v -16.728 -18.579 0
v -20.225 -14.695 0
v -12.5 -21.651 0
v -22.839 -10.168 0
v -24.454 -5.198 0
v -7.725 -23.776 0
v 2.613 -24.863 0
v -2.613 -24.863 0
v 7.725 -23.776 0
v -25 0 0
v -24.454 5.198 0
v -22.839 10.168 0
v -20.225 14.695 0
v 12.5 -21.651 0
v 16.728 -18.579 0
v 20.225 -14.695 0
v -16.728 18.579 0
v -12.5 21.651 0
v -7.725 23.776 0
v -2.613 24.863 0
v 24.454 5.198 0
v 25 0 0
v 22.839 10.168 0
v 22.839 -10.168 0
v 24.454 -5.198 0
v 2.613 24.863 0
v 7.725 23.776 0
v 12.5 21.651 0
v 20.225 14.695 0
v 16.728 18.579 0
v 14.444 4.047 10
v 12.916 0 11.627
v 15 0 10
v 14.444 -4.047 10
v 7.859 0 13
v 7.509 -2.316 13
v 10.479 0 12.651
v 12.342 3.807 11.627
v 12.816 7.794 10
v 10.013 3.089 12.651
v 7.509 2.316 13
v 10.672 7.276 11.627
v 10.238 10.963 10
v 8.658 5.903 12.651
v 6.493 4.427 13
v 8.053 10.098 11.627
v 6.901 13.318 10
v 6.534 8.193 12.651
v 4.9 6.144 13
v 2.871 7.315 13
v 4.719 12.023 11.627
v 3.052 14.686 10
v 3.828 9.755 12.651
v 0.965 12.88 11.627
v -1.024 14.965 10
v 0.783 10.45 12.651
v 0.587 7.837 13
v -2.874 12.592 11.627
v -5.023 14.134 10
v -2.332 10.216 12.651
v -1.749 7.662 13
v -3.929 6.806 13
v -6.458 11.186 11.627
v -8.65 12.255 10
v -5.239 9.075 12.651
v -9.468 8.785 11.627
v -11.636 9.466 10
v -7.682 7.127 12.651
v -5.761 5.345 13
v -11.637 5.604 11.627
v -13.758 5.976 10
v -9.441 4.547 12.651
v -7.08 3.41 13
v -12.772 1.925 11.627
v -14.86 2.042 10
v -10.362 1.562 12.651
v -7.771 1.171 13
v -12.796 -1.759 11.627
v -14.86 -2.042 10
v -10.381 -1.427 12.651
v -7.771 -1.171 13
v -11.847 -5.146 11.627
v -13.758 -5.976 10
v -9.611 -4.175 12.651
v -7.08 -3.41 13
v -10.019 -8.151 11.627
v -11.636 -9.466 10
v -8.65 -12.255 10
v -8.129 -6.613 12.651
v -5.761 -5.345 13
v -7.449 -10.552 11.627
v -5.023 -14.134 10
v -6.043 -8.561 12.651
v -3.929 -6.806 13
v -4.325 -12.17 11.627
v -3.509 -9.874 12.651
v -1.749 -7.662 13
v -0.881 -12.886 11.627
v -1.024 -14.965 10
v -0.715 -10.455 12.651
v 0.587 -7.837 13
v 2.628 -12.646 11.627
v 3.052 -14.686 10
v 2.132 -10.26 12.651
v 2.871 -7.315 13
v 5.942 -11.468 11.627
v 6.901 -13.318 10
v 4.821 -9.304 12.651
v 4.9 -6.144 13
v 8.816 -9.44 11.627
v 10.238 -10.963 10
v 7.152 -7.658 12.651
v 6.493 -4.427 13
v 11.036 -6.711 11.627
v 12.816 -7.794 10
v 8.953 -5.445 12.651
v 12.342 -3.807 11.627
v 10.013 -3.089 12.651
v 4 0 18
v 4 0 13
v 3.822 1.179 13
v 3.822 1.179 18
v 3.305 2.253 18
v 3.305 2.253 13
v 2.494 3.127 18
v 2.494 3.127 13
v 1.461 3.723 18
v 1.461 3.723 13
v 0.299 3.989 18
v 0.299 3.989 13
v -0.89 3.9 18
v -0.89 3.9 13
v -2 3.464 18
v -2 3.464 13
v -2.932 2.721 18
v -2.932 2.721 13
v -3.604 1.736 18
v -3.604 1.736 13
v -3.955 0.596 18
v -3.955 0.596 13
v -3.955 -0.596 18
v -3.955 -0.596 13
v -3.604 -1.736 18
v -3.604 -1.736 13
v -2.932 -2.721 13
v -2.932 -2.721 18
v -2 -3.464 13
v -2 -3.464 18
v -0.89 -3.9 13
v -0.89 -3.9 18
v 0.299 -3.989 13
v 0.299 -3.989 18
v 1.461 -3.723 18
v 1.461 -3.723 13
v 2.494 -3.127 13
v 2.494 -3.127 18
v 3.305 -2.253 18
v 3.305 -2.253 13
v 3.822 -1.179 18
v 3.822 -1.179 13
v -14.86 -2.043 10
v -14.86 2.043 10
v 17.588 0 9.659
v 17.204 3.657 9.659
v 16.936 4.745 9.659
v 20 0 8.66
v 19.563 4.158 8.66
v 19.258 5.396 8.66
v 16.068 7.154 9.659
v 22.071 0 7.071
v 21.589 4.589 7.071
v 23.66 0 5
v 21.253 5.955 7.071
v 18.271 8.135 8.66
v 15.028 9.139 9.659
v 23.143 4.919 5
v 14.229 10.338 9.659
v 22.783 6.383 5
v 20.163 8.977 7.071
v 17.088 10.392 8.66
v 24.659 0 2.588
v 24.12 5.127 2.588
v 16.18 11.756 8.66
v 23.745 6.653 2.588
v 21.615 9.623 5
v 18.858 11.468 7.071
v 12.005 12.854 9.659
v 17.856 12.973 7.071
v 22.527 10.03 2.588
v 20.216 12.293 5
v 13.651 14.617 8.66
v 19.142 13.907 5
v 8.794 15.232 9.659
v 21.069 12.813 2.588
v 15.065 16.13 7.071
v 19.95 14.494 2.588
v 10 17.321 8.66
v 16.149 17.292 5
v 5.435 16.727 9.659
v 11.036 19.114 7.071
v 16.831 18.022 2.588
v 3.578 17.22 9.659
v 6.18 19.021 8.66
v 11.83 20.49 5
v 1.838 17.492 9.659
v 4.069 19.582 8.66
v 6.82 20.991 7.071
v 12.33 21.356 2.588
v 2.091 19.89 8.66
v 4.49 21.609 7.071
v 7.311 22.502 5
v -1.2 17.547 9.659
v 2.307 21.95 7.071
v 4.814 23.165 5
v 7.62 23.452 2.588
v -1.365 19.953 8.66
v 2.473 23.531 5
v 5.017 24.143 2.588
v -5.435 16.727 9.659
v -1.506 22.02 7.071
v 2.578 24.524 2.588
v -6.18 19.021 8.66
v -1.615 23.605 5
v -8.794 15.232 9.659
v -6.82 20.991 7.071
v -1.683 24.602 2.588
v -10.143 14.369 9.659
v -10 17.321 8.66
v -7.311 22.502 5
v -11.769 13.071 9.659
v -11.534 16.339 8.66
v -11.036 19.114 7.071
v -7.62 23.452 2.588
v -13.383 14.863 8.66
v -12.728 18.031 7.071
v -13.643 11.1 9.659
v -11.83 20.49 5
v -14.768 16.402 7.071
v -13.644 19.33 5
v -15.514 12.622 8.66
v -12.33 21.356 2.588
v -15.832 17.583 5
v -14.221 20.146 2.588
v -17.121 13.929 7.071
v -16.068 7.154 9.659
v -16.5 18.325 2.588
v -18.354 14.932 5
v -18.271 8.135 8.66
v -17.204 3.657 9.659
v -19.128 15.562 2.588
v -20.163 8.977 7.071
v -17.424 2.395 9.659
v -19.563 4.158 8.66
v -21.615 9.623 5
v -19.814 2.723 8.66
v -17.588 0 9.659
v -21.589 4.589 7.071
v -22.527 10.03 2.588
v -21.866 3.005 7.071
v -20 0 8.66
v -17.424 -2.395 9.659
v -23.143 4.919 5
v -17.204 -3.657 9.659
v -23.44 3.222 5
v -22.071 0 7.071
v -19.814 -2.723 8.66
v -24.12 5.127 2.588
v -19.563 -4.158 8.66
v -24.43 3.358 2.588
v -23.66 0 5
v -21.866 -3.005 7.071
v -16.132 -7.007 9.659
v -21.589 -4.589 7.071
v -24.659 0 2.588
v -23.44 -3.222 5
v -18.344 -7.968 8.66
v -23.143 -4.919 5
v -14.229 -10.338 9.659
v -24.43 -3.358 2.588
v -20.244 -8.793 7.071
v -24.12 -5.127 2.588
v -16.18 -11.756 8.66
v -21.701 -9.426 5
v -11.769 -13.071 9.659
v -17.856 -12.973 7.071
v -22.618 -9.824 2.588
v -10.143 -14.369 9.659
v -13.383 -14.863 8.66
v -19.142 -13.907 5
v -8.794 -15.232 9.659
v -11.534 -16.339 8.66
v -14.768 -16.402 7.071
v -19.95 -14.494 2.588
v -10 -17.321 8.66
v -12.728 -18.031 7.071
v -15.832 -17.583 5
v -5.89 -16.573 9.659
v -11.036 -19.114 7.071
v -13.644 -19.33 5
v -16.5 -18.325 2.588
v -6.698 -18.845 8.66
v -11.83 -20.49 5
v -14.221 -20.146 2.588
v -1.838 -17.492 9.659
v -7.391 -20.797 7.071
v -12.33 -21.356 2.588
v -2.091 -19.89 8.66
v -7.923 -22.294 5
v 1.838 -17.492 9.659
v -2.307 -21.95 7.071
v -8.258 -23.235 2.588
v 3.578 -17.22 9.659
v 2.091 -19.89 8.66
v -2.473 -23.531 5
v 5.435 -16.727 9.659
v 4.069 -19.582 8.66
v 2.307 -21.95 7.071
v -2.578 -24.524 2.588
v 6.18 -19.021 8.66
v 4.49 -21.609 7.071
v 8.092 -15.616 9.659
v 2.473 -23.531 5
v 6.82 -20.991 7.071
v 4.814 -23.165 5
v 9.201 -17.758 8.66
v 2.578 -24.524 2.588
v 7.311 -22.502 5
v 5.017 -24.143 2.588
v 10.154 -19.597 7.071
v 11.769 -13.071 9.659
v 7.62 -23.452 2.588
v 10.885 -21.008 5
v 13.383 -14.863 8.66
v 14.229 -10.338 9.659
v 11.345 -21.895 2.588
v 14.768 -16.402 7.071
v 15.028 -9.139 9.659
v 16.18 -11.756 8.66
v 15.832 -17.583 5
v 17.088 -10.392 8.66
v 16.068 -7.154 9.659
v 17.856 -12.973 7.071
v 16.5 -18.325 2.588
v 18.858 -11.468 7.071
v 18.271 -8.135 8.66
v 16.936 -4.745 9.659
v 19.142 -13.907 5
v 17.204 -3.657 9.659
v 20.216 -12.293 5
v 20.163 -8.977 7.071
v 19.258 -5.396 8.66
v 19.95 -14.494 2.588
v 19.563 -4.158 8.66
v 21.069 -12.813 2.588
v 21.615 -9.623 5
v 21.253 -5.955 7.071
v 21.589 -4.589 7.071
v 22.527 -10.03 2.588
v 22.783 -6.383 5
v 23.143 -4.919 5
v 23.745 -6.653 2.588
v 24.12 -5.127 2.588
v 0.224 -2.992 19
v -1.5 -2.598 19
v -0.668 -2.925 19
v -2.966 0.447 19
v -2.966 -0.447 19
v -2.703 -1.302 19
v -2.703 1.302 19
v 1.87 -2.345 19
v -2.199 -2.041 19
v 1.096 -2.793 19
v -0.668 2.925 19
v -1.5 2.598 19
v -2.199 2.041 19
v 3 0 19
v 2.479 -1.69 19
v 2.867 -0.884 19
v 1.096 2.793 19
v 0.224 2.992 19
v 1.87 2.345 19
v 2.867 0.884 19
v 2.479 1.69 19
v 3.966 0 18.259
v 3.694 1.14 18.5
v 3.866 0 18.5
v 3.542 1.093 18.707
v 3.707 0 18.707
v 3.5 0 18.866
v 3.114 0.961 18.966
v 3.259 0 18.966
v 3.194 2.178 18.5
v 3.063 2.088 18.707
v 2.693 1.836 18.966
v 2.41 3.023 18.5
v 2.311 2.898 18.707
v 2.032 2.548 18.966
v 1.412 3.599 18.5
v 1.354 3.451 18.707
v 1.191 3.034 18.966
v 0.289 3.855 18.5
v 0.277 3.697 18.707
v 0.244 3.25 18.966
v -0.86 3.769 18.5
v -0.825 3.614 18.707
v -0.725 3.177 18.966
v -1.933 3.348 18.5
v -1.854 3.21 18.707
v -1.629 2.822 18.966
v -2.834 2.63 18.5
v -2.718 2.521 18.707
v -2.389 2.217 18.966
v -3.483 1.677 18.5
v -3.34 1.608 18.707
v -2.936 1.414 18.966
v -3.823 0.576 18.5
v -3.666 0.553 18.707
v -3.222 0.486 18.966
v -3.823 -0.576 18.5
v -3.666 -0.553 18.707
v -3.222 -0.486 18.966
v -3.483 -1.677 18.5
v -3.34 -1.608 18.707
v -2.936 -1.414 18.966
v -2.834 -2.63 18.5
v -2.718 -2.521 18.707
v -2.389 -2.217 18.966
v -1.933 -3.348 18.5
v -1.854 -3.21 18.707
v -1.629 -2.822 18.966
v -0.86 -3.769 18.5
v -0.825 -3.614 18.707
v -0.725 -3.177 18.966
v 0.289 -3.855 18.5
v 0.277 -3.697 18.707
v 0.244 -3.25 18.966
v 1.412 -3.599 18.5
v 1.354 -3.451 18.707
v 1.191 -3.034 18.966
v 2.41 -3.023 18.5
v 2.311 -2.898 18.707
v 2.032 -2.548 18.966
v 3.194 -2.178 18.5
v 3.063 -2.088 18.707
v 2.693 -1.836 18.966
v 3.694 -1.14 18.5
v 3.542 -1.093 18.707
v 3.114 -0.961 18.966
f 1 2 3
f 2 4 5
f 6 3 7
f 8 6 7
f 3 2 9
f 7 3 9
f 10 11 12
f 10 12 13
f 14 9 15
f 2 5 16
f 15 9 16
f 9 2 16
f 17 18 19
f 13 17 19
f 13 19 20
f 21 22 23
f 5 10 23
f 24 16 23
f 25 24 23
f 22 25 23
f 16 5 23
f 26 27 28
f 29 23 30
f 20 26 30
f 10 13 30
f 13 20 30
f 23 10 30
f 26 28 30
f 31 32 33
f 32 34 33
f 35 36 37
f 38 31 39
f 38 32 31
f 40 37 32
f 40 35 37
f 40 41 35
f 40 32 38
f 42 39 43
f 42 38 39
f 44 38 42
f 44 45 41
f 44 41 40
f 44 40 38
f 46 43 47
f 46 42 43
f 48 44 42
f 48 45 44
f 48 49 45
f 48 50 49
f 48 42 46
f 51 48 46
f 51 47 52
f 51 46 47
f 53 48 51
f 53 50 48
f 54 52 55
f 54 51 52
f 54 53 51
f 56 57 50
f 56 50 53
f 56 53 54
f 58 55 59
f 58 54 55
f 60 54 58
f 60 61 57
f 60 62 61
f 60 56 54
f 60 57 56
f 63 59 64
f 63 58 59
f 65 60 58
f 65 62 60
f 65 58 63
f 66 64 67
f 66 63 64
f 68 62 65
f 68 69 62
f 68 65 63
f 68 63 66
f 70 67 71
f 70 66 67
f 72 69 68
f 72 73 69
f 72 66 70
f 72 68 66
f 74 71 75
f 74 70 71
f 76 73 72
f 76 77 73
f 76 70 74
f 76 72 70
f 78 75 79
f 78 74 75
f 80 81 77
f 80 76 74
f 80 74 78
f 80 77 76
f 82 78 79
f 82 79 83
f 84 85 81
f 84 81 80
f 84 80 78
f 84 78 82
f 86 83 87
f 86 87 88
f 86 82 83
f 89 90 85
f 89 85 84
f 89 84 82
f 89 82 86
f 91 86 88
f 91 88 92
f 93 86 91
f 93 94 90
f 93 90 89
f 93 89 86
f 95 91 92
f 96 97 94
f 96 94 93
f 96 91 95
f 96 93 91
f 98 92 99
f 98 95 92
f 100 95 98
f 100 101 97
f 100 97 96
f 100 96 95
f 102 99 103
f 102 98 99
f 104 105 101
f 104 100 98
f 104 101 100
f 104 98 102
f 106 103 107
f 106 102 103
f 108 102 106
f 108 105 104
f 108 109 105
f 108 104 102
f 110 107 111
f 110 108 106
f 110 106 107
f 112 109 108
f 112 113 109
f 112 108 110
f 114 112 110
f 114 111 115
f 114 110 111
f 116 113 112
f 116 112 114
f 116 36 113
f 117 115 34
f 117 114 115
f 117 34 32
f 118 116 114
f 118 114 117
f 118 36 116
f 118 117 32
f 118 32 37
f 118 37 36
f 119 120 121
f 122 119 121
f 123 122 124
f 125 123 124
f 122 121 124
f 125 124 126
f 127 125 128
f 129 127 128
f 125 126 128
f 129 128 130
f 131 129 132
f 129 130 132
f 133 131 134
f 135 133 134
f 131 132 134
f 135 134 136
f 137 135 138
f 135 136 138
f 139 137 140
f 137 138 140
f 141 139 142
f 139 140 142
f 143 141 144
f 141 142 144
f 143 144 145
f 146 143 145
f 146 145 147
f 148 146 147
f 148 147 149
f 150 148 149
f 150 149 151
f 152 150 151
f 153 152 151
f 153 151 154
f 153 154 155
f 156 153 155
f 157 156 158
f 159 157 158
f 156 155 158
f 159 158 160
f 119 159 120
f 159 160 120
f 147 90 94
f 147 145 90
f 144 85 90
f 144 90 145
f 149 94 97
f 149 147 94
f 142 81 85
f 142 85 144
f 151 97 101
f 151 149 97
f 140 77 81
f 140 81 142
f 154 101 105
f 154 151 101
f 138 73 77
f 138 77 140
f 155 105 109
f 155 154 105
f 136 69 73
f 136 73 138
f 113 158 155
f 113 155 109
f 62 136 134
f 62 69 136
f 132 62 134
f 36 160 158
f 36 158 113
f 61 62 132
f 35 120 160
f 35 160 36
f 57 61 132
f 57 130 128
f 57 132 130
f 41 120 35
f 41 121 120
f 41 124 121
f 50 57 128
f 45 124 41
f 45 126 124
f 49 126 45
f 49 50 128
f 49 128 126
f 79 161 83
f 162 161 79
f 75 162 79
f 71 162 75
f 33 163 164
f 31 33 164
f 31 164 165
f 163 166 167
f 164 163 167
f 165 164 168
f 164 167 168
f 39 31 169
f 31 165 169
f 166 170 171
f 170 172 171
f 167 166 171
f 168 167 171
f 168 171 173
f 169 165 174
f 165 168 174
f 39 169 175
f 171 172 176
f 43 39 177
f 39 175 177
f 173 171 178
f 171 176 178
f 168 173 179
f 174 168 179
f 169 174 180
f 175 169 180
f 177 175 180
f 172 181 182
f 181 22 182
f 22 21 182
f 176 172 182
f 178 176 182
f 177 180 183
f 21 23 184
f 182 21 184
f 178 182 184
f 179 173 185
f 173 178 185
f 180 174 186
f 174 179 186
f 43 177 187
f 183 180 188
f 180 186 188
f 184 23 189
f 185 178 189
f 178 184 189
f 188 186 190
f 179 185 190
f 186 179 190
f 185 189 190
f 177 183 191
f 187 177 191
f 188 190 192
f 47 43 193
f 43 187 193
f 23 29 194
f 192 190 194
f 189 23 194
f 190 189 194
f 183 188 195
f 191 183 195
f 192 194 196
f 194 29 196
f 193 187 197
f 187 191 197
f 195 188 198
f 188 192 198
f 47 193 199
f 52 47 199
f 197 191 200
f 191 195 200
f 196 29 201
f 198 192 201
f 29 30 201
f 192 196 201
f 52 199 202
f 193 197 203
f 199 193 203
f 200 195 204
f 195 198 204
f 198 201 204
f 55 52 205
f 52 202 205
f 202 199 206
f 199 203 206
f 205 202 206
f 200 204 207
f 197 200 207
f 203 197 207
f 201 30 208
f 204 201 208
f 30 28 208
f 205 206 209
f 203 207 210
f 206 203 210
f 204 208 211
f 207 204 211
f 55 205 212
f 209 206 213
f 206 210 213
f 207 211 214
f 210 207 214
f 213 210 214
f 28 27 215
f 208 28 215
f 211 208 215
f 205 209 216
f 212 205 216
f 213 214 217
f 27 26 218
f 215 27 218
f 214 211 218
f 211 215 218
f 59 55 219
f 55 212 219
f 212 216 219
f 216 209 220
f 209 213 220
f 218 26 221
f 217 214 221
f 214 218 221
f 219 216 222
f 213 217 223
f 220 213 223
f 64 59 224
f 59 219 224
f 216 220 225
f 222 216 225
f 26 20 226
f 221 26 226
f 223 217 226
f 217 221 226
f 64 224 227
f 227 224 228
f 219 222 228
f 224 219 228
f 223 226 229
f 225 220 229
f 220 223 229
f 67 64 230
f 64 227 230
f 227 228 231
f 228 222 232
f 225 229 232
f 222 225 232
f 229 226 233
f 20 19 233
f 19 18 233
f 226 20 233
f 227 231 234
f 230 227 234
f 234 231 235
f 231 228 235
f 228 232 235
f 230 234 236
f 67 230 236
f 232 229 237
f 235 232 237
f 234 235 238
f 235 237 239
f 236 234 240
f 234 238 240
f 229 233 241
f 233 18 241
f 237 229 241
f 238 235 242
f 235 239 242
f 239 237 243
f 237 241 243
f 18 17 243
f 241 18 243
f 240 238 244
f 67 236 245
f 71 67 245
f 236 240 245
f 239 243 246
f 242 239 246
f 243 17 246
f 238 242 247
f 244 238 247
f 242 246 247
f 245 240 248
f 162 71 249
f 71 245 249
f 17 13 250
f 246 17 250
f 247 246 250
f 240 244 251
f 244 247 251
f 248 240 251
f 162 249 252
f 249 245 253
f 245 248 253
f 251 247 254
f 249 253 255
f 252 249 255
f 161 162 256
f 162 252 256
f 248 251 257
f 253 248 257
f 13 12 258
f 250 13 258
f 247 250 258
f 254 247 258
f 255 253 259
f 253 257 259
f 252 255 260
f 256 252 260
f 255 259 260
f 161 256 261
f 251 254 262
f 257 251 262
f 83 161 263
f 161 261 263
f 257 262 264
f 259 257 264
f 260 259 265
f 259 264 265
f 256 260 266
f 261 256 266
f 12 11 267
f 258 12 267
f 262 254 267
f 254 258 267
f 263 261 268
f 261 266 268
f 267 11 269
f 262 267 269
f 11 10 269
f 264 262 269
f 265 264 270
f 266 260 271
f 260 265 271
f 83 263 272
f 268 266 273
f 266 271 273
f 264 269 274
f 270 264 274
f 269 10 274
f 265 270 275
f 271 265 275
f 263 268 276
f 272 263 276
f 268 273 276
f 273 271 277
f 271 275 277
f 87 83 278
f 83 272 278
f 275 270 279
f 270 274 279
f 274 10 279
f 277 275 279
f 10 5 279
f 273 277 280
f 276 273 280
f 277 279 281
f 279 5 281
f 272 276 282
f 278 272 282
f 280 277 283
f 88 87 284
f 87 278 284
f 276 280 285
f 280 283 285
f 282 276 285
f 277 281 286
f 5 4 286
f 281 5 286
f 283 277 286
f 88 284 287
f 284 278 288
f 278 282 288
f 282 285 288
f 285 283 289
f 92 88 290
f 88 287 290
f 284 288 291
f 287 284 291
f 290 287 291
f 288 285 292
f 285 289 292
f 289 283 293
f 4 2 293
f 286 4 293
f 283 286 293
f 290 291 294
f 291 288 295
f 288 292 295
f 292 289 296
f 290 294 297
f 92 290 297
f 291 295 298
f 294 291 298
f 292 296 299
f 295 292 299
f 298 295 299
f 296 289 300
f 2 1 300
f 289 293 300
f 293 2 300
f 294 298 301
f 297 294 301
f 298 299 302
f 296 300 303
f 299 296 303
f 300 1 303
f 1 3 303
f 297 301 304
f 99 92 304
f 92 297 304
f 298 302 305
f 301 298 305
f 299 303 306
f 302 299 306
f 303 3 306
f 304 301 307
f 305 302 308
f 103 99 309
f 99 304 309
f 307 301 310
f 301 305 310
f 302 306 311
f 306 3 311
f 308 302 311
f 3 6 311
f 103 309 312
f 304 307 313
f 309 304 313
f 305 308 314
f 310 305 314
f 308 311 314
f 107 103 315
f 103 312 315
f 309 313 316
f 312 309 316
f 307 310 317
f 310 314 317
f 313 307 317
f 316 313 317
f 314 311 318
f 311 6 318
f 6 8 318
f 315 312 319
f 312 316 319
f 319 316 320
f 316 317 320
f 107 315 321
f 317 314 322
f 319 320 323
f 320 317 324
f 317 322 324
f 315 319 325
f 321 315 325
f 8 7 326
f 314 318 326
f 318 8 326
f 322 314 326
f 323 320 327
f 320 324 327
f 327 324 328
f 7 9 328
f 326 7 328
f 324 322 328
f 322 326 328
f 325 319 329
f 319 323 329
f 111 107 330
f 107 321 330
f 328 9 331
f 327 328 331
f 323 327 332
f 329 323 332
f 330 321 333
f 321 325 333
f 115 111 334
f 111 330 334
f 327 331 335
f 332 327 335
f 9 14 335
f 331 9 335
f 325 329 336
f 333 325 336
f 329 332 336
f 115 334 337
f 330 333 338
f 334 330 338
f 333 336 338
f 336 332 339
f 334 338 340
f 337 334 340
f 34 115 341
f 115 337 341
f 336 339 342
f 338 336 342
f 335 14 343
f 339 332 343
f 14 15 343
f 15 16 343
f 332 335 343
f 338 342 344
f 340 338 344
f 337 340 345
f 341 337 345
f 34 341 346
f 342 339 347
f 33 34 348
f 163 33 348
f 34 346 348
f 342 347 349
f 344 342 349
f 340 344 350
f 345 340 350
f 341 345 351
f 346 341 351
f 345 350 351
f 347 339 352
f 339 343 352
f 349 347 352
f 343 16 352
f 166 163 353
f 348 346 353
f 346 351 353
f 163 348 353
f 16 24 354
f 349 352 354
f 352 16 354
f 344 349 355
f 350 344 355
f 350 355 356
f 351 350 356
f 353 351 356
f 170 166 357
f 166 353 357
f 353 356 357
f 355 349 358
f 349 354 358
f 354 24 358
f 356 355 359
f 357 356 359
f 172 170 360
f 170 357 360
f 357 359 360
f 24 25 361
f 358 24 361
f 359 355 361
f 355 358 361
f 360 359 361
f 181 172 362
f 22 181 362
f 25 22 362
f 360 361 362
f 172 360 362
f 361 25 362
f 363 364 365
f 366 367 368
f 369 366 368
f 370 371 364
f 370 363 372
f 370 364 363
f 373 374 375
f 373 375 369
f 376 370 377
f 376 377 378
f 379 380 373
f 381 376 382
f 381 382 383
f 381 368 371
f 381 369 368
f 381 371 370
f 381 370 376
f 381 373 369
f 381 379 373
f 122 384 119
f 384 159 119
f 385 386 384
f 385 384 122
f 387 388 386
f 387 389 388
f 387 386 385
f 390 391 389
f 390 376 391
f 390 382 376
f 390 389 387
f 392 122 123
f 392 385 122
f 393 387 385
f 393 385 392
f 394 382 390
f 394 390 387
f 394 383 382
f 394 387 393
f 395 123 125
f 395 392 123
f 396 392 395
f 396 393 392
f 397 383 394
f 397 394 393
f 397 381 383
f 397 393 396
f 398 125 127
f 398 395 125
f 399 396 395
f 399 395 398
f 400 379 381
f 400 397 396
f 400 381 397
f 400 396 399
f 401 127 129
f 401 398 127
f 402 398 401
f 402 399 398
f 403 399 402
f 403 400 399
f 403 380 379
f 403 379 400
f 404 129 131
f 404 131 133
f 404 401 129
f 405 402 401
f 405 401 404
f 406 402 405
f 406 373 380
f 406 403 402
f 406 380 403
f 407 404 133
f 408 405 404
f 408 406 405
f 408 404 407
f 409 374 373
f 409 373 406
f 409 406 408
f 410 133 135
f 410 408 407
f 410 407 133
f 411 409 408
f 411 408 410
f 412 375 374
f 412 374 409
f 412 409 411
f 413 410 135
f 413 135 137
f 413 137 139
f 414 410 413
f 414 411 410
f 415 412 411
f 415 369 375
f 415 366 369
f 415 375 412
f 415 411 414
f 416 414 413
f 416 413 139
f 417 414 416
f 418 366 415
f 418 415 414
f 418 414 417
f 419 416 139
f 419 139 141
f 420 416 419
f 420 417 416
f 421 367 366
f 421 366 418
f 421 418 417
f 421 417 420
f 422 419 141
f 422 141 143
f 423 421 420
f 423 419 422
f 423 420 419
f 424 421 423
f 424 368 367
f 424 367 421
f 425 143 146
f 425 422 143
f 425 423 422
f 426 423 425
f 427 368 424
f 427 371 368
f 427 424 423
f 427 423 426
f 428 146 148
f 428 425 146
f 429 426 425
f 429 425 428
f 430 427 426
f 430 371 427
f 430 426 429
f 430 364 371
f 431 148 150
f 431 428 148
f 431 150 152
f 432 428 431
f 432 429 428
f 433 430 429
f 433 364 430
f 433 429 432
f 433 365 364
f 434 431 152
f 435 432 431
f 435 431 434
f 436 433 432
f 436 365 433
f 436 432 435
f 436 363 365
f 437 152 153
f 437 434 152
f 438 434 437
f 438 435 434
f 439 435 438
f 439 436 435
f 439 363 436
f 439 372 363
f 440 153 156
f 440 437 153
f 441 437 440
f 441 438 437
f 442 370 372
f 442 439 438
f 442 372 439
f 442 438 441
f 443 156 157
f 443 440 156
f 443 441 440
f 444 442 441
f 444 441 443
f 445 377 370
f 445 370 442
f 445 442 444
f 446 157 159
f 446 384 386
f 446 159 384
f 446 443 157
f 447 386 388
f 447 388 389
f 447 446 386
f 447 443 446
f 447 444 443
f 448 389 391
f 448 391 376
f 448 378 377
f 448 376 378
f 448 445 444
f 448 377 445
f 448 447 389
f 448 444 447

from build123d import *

# Parameters (mm, degrees)
ESQUISSE1_R        = 25
BOSS_EXTRU_1_DEPTH = 10
ESQUISSE2_R        = 15
BOSS_EXTRU_2_DEPTH = 3
ESQUISSE3_R        = 4
BOSS_EXTRU_3_DEPTH = 6
CONG_1_R           = 10
CONG_2_R           = 1
CONG_3_R           = 10


# Some blends are built 0.0001 mm under size
with BuildPart() as part:
    # Esquisse1 → Boss.-Extru.1 (new body)
    with BuildSketch(Plane.XY):
        Circle(ESQUISSE1_R)
    extrude(amount=BOSS_EXTRU_1_DEPTH)

    # Esquisse2 → Boss.-Extru.2 (add)
    with BuildSketch(Plane.XY.offset(10)):
        Circle(ESQUISSE2_R)
    extrude(amount=BOSS_EXTRU_2_DEPTH)

    # Esquisse3 → Boss.-Extru.3 (add)
    with BuildSketch(Plane.XY.offset(13)):
        Circle(ESQUISSE3_R)
    extrude(amount=BOSS_EXTRU_3_DEPTH)

    # Congé1
    # the kernel refuses this fillet: 10 mm, written as the material it takes off along each edge
    with BuildSketch(Plane(origin=(0, 0, 13), x_dir=(1, 0, 0), z_dir=(0, -1, 0))) as cong_1_piece_1:
        with BuildLine():
            CenterArc((7.858571571, -10), CONG_1_R, 44.427004001, 45.572995999)
            Line((7.858571571, 0), (7.858571571, 0.2))
            Line((7.858571571, 0.2), (15, 0.2))
            Line((15, 0.2), (15.2, 0))
            ThreePointArc((15.2, 0), (15.2, -1.5), (15.142828569, -2.86))
            Line((15.142828569, -2.86), (15, -3))
        make_face()
    revolve(axis=Axis((0, 0, 13), (0, 0, 1)), mode=Mode.SUBTRACT)

    # Congé2
    cong_2_edges = [part.edges().sort_by_distance(p)[0] for p in [
        (-4, 0, 19),
    ]]
    fillet(cong_2_edges, radius=CONG_2_R)

    # Congé3
    cong_3_edges = [part.edges().sort_by_distance(p)[0] for p in [
        (-25, 0, 10),
    ]]
    fillet(cong_3_edges, radius=CONG_3_R - 0.0001)  # a hair under: the kernel refuses the full size


solid = part.part
